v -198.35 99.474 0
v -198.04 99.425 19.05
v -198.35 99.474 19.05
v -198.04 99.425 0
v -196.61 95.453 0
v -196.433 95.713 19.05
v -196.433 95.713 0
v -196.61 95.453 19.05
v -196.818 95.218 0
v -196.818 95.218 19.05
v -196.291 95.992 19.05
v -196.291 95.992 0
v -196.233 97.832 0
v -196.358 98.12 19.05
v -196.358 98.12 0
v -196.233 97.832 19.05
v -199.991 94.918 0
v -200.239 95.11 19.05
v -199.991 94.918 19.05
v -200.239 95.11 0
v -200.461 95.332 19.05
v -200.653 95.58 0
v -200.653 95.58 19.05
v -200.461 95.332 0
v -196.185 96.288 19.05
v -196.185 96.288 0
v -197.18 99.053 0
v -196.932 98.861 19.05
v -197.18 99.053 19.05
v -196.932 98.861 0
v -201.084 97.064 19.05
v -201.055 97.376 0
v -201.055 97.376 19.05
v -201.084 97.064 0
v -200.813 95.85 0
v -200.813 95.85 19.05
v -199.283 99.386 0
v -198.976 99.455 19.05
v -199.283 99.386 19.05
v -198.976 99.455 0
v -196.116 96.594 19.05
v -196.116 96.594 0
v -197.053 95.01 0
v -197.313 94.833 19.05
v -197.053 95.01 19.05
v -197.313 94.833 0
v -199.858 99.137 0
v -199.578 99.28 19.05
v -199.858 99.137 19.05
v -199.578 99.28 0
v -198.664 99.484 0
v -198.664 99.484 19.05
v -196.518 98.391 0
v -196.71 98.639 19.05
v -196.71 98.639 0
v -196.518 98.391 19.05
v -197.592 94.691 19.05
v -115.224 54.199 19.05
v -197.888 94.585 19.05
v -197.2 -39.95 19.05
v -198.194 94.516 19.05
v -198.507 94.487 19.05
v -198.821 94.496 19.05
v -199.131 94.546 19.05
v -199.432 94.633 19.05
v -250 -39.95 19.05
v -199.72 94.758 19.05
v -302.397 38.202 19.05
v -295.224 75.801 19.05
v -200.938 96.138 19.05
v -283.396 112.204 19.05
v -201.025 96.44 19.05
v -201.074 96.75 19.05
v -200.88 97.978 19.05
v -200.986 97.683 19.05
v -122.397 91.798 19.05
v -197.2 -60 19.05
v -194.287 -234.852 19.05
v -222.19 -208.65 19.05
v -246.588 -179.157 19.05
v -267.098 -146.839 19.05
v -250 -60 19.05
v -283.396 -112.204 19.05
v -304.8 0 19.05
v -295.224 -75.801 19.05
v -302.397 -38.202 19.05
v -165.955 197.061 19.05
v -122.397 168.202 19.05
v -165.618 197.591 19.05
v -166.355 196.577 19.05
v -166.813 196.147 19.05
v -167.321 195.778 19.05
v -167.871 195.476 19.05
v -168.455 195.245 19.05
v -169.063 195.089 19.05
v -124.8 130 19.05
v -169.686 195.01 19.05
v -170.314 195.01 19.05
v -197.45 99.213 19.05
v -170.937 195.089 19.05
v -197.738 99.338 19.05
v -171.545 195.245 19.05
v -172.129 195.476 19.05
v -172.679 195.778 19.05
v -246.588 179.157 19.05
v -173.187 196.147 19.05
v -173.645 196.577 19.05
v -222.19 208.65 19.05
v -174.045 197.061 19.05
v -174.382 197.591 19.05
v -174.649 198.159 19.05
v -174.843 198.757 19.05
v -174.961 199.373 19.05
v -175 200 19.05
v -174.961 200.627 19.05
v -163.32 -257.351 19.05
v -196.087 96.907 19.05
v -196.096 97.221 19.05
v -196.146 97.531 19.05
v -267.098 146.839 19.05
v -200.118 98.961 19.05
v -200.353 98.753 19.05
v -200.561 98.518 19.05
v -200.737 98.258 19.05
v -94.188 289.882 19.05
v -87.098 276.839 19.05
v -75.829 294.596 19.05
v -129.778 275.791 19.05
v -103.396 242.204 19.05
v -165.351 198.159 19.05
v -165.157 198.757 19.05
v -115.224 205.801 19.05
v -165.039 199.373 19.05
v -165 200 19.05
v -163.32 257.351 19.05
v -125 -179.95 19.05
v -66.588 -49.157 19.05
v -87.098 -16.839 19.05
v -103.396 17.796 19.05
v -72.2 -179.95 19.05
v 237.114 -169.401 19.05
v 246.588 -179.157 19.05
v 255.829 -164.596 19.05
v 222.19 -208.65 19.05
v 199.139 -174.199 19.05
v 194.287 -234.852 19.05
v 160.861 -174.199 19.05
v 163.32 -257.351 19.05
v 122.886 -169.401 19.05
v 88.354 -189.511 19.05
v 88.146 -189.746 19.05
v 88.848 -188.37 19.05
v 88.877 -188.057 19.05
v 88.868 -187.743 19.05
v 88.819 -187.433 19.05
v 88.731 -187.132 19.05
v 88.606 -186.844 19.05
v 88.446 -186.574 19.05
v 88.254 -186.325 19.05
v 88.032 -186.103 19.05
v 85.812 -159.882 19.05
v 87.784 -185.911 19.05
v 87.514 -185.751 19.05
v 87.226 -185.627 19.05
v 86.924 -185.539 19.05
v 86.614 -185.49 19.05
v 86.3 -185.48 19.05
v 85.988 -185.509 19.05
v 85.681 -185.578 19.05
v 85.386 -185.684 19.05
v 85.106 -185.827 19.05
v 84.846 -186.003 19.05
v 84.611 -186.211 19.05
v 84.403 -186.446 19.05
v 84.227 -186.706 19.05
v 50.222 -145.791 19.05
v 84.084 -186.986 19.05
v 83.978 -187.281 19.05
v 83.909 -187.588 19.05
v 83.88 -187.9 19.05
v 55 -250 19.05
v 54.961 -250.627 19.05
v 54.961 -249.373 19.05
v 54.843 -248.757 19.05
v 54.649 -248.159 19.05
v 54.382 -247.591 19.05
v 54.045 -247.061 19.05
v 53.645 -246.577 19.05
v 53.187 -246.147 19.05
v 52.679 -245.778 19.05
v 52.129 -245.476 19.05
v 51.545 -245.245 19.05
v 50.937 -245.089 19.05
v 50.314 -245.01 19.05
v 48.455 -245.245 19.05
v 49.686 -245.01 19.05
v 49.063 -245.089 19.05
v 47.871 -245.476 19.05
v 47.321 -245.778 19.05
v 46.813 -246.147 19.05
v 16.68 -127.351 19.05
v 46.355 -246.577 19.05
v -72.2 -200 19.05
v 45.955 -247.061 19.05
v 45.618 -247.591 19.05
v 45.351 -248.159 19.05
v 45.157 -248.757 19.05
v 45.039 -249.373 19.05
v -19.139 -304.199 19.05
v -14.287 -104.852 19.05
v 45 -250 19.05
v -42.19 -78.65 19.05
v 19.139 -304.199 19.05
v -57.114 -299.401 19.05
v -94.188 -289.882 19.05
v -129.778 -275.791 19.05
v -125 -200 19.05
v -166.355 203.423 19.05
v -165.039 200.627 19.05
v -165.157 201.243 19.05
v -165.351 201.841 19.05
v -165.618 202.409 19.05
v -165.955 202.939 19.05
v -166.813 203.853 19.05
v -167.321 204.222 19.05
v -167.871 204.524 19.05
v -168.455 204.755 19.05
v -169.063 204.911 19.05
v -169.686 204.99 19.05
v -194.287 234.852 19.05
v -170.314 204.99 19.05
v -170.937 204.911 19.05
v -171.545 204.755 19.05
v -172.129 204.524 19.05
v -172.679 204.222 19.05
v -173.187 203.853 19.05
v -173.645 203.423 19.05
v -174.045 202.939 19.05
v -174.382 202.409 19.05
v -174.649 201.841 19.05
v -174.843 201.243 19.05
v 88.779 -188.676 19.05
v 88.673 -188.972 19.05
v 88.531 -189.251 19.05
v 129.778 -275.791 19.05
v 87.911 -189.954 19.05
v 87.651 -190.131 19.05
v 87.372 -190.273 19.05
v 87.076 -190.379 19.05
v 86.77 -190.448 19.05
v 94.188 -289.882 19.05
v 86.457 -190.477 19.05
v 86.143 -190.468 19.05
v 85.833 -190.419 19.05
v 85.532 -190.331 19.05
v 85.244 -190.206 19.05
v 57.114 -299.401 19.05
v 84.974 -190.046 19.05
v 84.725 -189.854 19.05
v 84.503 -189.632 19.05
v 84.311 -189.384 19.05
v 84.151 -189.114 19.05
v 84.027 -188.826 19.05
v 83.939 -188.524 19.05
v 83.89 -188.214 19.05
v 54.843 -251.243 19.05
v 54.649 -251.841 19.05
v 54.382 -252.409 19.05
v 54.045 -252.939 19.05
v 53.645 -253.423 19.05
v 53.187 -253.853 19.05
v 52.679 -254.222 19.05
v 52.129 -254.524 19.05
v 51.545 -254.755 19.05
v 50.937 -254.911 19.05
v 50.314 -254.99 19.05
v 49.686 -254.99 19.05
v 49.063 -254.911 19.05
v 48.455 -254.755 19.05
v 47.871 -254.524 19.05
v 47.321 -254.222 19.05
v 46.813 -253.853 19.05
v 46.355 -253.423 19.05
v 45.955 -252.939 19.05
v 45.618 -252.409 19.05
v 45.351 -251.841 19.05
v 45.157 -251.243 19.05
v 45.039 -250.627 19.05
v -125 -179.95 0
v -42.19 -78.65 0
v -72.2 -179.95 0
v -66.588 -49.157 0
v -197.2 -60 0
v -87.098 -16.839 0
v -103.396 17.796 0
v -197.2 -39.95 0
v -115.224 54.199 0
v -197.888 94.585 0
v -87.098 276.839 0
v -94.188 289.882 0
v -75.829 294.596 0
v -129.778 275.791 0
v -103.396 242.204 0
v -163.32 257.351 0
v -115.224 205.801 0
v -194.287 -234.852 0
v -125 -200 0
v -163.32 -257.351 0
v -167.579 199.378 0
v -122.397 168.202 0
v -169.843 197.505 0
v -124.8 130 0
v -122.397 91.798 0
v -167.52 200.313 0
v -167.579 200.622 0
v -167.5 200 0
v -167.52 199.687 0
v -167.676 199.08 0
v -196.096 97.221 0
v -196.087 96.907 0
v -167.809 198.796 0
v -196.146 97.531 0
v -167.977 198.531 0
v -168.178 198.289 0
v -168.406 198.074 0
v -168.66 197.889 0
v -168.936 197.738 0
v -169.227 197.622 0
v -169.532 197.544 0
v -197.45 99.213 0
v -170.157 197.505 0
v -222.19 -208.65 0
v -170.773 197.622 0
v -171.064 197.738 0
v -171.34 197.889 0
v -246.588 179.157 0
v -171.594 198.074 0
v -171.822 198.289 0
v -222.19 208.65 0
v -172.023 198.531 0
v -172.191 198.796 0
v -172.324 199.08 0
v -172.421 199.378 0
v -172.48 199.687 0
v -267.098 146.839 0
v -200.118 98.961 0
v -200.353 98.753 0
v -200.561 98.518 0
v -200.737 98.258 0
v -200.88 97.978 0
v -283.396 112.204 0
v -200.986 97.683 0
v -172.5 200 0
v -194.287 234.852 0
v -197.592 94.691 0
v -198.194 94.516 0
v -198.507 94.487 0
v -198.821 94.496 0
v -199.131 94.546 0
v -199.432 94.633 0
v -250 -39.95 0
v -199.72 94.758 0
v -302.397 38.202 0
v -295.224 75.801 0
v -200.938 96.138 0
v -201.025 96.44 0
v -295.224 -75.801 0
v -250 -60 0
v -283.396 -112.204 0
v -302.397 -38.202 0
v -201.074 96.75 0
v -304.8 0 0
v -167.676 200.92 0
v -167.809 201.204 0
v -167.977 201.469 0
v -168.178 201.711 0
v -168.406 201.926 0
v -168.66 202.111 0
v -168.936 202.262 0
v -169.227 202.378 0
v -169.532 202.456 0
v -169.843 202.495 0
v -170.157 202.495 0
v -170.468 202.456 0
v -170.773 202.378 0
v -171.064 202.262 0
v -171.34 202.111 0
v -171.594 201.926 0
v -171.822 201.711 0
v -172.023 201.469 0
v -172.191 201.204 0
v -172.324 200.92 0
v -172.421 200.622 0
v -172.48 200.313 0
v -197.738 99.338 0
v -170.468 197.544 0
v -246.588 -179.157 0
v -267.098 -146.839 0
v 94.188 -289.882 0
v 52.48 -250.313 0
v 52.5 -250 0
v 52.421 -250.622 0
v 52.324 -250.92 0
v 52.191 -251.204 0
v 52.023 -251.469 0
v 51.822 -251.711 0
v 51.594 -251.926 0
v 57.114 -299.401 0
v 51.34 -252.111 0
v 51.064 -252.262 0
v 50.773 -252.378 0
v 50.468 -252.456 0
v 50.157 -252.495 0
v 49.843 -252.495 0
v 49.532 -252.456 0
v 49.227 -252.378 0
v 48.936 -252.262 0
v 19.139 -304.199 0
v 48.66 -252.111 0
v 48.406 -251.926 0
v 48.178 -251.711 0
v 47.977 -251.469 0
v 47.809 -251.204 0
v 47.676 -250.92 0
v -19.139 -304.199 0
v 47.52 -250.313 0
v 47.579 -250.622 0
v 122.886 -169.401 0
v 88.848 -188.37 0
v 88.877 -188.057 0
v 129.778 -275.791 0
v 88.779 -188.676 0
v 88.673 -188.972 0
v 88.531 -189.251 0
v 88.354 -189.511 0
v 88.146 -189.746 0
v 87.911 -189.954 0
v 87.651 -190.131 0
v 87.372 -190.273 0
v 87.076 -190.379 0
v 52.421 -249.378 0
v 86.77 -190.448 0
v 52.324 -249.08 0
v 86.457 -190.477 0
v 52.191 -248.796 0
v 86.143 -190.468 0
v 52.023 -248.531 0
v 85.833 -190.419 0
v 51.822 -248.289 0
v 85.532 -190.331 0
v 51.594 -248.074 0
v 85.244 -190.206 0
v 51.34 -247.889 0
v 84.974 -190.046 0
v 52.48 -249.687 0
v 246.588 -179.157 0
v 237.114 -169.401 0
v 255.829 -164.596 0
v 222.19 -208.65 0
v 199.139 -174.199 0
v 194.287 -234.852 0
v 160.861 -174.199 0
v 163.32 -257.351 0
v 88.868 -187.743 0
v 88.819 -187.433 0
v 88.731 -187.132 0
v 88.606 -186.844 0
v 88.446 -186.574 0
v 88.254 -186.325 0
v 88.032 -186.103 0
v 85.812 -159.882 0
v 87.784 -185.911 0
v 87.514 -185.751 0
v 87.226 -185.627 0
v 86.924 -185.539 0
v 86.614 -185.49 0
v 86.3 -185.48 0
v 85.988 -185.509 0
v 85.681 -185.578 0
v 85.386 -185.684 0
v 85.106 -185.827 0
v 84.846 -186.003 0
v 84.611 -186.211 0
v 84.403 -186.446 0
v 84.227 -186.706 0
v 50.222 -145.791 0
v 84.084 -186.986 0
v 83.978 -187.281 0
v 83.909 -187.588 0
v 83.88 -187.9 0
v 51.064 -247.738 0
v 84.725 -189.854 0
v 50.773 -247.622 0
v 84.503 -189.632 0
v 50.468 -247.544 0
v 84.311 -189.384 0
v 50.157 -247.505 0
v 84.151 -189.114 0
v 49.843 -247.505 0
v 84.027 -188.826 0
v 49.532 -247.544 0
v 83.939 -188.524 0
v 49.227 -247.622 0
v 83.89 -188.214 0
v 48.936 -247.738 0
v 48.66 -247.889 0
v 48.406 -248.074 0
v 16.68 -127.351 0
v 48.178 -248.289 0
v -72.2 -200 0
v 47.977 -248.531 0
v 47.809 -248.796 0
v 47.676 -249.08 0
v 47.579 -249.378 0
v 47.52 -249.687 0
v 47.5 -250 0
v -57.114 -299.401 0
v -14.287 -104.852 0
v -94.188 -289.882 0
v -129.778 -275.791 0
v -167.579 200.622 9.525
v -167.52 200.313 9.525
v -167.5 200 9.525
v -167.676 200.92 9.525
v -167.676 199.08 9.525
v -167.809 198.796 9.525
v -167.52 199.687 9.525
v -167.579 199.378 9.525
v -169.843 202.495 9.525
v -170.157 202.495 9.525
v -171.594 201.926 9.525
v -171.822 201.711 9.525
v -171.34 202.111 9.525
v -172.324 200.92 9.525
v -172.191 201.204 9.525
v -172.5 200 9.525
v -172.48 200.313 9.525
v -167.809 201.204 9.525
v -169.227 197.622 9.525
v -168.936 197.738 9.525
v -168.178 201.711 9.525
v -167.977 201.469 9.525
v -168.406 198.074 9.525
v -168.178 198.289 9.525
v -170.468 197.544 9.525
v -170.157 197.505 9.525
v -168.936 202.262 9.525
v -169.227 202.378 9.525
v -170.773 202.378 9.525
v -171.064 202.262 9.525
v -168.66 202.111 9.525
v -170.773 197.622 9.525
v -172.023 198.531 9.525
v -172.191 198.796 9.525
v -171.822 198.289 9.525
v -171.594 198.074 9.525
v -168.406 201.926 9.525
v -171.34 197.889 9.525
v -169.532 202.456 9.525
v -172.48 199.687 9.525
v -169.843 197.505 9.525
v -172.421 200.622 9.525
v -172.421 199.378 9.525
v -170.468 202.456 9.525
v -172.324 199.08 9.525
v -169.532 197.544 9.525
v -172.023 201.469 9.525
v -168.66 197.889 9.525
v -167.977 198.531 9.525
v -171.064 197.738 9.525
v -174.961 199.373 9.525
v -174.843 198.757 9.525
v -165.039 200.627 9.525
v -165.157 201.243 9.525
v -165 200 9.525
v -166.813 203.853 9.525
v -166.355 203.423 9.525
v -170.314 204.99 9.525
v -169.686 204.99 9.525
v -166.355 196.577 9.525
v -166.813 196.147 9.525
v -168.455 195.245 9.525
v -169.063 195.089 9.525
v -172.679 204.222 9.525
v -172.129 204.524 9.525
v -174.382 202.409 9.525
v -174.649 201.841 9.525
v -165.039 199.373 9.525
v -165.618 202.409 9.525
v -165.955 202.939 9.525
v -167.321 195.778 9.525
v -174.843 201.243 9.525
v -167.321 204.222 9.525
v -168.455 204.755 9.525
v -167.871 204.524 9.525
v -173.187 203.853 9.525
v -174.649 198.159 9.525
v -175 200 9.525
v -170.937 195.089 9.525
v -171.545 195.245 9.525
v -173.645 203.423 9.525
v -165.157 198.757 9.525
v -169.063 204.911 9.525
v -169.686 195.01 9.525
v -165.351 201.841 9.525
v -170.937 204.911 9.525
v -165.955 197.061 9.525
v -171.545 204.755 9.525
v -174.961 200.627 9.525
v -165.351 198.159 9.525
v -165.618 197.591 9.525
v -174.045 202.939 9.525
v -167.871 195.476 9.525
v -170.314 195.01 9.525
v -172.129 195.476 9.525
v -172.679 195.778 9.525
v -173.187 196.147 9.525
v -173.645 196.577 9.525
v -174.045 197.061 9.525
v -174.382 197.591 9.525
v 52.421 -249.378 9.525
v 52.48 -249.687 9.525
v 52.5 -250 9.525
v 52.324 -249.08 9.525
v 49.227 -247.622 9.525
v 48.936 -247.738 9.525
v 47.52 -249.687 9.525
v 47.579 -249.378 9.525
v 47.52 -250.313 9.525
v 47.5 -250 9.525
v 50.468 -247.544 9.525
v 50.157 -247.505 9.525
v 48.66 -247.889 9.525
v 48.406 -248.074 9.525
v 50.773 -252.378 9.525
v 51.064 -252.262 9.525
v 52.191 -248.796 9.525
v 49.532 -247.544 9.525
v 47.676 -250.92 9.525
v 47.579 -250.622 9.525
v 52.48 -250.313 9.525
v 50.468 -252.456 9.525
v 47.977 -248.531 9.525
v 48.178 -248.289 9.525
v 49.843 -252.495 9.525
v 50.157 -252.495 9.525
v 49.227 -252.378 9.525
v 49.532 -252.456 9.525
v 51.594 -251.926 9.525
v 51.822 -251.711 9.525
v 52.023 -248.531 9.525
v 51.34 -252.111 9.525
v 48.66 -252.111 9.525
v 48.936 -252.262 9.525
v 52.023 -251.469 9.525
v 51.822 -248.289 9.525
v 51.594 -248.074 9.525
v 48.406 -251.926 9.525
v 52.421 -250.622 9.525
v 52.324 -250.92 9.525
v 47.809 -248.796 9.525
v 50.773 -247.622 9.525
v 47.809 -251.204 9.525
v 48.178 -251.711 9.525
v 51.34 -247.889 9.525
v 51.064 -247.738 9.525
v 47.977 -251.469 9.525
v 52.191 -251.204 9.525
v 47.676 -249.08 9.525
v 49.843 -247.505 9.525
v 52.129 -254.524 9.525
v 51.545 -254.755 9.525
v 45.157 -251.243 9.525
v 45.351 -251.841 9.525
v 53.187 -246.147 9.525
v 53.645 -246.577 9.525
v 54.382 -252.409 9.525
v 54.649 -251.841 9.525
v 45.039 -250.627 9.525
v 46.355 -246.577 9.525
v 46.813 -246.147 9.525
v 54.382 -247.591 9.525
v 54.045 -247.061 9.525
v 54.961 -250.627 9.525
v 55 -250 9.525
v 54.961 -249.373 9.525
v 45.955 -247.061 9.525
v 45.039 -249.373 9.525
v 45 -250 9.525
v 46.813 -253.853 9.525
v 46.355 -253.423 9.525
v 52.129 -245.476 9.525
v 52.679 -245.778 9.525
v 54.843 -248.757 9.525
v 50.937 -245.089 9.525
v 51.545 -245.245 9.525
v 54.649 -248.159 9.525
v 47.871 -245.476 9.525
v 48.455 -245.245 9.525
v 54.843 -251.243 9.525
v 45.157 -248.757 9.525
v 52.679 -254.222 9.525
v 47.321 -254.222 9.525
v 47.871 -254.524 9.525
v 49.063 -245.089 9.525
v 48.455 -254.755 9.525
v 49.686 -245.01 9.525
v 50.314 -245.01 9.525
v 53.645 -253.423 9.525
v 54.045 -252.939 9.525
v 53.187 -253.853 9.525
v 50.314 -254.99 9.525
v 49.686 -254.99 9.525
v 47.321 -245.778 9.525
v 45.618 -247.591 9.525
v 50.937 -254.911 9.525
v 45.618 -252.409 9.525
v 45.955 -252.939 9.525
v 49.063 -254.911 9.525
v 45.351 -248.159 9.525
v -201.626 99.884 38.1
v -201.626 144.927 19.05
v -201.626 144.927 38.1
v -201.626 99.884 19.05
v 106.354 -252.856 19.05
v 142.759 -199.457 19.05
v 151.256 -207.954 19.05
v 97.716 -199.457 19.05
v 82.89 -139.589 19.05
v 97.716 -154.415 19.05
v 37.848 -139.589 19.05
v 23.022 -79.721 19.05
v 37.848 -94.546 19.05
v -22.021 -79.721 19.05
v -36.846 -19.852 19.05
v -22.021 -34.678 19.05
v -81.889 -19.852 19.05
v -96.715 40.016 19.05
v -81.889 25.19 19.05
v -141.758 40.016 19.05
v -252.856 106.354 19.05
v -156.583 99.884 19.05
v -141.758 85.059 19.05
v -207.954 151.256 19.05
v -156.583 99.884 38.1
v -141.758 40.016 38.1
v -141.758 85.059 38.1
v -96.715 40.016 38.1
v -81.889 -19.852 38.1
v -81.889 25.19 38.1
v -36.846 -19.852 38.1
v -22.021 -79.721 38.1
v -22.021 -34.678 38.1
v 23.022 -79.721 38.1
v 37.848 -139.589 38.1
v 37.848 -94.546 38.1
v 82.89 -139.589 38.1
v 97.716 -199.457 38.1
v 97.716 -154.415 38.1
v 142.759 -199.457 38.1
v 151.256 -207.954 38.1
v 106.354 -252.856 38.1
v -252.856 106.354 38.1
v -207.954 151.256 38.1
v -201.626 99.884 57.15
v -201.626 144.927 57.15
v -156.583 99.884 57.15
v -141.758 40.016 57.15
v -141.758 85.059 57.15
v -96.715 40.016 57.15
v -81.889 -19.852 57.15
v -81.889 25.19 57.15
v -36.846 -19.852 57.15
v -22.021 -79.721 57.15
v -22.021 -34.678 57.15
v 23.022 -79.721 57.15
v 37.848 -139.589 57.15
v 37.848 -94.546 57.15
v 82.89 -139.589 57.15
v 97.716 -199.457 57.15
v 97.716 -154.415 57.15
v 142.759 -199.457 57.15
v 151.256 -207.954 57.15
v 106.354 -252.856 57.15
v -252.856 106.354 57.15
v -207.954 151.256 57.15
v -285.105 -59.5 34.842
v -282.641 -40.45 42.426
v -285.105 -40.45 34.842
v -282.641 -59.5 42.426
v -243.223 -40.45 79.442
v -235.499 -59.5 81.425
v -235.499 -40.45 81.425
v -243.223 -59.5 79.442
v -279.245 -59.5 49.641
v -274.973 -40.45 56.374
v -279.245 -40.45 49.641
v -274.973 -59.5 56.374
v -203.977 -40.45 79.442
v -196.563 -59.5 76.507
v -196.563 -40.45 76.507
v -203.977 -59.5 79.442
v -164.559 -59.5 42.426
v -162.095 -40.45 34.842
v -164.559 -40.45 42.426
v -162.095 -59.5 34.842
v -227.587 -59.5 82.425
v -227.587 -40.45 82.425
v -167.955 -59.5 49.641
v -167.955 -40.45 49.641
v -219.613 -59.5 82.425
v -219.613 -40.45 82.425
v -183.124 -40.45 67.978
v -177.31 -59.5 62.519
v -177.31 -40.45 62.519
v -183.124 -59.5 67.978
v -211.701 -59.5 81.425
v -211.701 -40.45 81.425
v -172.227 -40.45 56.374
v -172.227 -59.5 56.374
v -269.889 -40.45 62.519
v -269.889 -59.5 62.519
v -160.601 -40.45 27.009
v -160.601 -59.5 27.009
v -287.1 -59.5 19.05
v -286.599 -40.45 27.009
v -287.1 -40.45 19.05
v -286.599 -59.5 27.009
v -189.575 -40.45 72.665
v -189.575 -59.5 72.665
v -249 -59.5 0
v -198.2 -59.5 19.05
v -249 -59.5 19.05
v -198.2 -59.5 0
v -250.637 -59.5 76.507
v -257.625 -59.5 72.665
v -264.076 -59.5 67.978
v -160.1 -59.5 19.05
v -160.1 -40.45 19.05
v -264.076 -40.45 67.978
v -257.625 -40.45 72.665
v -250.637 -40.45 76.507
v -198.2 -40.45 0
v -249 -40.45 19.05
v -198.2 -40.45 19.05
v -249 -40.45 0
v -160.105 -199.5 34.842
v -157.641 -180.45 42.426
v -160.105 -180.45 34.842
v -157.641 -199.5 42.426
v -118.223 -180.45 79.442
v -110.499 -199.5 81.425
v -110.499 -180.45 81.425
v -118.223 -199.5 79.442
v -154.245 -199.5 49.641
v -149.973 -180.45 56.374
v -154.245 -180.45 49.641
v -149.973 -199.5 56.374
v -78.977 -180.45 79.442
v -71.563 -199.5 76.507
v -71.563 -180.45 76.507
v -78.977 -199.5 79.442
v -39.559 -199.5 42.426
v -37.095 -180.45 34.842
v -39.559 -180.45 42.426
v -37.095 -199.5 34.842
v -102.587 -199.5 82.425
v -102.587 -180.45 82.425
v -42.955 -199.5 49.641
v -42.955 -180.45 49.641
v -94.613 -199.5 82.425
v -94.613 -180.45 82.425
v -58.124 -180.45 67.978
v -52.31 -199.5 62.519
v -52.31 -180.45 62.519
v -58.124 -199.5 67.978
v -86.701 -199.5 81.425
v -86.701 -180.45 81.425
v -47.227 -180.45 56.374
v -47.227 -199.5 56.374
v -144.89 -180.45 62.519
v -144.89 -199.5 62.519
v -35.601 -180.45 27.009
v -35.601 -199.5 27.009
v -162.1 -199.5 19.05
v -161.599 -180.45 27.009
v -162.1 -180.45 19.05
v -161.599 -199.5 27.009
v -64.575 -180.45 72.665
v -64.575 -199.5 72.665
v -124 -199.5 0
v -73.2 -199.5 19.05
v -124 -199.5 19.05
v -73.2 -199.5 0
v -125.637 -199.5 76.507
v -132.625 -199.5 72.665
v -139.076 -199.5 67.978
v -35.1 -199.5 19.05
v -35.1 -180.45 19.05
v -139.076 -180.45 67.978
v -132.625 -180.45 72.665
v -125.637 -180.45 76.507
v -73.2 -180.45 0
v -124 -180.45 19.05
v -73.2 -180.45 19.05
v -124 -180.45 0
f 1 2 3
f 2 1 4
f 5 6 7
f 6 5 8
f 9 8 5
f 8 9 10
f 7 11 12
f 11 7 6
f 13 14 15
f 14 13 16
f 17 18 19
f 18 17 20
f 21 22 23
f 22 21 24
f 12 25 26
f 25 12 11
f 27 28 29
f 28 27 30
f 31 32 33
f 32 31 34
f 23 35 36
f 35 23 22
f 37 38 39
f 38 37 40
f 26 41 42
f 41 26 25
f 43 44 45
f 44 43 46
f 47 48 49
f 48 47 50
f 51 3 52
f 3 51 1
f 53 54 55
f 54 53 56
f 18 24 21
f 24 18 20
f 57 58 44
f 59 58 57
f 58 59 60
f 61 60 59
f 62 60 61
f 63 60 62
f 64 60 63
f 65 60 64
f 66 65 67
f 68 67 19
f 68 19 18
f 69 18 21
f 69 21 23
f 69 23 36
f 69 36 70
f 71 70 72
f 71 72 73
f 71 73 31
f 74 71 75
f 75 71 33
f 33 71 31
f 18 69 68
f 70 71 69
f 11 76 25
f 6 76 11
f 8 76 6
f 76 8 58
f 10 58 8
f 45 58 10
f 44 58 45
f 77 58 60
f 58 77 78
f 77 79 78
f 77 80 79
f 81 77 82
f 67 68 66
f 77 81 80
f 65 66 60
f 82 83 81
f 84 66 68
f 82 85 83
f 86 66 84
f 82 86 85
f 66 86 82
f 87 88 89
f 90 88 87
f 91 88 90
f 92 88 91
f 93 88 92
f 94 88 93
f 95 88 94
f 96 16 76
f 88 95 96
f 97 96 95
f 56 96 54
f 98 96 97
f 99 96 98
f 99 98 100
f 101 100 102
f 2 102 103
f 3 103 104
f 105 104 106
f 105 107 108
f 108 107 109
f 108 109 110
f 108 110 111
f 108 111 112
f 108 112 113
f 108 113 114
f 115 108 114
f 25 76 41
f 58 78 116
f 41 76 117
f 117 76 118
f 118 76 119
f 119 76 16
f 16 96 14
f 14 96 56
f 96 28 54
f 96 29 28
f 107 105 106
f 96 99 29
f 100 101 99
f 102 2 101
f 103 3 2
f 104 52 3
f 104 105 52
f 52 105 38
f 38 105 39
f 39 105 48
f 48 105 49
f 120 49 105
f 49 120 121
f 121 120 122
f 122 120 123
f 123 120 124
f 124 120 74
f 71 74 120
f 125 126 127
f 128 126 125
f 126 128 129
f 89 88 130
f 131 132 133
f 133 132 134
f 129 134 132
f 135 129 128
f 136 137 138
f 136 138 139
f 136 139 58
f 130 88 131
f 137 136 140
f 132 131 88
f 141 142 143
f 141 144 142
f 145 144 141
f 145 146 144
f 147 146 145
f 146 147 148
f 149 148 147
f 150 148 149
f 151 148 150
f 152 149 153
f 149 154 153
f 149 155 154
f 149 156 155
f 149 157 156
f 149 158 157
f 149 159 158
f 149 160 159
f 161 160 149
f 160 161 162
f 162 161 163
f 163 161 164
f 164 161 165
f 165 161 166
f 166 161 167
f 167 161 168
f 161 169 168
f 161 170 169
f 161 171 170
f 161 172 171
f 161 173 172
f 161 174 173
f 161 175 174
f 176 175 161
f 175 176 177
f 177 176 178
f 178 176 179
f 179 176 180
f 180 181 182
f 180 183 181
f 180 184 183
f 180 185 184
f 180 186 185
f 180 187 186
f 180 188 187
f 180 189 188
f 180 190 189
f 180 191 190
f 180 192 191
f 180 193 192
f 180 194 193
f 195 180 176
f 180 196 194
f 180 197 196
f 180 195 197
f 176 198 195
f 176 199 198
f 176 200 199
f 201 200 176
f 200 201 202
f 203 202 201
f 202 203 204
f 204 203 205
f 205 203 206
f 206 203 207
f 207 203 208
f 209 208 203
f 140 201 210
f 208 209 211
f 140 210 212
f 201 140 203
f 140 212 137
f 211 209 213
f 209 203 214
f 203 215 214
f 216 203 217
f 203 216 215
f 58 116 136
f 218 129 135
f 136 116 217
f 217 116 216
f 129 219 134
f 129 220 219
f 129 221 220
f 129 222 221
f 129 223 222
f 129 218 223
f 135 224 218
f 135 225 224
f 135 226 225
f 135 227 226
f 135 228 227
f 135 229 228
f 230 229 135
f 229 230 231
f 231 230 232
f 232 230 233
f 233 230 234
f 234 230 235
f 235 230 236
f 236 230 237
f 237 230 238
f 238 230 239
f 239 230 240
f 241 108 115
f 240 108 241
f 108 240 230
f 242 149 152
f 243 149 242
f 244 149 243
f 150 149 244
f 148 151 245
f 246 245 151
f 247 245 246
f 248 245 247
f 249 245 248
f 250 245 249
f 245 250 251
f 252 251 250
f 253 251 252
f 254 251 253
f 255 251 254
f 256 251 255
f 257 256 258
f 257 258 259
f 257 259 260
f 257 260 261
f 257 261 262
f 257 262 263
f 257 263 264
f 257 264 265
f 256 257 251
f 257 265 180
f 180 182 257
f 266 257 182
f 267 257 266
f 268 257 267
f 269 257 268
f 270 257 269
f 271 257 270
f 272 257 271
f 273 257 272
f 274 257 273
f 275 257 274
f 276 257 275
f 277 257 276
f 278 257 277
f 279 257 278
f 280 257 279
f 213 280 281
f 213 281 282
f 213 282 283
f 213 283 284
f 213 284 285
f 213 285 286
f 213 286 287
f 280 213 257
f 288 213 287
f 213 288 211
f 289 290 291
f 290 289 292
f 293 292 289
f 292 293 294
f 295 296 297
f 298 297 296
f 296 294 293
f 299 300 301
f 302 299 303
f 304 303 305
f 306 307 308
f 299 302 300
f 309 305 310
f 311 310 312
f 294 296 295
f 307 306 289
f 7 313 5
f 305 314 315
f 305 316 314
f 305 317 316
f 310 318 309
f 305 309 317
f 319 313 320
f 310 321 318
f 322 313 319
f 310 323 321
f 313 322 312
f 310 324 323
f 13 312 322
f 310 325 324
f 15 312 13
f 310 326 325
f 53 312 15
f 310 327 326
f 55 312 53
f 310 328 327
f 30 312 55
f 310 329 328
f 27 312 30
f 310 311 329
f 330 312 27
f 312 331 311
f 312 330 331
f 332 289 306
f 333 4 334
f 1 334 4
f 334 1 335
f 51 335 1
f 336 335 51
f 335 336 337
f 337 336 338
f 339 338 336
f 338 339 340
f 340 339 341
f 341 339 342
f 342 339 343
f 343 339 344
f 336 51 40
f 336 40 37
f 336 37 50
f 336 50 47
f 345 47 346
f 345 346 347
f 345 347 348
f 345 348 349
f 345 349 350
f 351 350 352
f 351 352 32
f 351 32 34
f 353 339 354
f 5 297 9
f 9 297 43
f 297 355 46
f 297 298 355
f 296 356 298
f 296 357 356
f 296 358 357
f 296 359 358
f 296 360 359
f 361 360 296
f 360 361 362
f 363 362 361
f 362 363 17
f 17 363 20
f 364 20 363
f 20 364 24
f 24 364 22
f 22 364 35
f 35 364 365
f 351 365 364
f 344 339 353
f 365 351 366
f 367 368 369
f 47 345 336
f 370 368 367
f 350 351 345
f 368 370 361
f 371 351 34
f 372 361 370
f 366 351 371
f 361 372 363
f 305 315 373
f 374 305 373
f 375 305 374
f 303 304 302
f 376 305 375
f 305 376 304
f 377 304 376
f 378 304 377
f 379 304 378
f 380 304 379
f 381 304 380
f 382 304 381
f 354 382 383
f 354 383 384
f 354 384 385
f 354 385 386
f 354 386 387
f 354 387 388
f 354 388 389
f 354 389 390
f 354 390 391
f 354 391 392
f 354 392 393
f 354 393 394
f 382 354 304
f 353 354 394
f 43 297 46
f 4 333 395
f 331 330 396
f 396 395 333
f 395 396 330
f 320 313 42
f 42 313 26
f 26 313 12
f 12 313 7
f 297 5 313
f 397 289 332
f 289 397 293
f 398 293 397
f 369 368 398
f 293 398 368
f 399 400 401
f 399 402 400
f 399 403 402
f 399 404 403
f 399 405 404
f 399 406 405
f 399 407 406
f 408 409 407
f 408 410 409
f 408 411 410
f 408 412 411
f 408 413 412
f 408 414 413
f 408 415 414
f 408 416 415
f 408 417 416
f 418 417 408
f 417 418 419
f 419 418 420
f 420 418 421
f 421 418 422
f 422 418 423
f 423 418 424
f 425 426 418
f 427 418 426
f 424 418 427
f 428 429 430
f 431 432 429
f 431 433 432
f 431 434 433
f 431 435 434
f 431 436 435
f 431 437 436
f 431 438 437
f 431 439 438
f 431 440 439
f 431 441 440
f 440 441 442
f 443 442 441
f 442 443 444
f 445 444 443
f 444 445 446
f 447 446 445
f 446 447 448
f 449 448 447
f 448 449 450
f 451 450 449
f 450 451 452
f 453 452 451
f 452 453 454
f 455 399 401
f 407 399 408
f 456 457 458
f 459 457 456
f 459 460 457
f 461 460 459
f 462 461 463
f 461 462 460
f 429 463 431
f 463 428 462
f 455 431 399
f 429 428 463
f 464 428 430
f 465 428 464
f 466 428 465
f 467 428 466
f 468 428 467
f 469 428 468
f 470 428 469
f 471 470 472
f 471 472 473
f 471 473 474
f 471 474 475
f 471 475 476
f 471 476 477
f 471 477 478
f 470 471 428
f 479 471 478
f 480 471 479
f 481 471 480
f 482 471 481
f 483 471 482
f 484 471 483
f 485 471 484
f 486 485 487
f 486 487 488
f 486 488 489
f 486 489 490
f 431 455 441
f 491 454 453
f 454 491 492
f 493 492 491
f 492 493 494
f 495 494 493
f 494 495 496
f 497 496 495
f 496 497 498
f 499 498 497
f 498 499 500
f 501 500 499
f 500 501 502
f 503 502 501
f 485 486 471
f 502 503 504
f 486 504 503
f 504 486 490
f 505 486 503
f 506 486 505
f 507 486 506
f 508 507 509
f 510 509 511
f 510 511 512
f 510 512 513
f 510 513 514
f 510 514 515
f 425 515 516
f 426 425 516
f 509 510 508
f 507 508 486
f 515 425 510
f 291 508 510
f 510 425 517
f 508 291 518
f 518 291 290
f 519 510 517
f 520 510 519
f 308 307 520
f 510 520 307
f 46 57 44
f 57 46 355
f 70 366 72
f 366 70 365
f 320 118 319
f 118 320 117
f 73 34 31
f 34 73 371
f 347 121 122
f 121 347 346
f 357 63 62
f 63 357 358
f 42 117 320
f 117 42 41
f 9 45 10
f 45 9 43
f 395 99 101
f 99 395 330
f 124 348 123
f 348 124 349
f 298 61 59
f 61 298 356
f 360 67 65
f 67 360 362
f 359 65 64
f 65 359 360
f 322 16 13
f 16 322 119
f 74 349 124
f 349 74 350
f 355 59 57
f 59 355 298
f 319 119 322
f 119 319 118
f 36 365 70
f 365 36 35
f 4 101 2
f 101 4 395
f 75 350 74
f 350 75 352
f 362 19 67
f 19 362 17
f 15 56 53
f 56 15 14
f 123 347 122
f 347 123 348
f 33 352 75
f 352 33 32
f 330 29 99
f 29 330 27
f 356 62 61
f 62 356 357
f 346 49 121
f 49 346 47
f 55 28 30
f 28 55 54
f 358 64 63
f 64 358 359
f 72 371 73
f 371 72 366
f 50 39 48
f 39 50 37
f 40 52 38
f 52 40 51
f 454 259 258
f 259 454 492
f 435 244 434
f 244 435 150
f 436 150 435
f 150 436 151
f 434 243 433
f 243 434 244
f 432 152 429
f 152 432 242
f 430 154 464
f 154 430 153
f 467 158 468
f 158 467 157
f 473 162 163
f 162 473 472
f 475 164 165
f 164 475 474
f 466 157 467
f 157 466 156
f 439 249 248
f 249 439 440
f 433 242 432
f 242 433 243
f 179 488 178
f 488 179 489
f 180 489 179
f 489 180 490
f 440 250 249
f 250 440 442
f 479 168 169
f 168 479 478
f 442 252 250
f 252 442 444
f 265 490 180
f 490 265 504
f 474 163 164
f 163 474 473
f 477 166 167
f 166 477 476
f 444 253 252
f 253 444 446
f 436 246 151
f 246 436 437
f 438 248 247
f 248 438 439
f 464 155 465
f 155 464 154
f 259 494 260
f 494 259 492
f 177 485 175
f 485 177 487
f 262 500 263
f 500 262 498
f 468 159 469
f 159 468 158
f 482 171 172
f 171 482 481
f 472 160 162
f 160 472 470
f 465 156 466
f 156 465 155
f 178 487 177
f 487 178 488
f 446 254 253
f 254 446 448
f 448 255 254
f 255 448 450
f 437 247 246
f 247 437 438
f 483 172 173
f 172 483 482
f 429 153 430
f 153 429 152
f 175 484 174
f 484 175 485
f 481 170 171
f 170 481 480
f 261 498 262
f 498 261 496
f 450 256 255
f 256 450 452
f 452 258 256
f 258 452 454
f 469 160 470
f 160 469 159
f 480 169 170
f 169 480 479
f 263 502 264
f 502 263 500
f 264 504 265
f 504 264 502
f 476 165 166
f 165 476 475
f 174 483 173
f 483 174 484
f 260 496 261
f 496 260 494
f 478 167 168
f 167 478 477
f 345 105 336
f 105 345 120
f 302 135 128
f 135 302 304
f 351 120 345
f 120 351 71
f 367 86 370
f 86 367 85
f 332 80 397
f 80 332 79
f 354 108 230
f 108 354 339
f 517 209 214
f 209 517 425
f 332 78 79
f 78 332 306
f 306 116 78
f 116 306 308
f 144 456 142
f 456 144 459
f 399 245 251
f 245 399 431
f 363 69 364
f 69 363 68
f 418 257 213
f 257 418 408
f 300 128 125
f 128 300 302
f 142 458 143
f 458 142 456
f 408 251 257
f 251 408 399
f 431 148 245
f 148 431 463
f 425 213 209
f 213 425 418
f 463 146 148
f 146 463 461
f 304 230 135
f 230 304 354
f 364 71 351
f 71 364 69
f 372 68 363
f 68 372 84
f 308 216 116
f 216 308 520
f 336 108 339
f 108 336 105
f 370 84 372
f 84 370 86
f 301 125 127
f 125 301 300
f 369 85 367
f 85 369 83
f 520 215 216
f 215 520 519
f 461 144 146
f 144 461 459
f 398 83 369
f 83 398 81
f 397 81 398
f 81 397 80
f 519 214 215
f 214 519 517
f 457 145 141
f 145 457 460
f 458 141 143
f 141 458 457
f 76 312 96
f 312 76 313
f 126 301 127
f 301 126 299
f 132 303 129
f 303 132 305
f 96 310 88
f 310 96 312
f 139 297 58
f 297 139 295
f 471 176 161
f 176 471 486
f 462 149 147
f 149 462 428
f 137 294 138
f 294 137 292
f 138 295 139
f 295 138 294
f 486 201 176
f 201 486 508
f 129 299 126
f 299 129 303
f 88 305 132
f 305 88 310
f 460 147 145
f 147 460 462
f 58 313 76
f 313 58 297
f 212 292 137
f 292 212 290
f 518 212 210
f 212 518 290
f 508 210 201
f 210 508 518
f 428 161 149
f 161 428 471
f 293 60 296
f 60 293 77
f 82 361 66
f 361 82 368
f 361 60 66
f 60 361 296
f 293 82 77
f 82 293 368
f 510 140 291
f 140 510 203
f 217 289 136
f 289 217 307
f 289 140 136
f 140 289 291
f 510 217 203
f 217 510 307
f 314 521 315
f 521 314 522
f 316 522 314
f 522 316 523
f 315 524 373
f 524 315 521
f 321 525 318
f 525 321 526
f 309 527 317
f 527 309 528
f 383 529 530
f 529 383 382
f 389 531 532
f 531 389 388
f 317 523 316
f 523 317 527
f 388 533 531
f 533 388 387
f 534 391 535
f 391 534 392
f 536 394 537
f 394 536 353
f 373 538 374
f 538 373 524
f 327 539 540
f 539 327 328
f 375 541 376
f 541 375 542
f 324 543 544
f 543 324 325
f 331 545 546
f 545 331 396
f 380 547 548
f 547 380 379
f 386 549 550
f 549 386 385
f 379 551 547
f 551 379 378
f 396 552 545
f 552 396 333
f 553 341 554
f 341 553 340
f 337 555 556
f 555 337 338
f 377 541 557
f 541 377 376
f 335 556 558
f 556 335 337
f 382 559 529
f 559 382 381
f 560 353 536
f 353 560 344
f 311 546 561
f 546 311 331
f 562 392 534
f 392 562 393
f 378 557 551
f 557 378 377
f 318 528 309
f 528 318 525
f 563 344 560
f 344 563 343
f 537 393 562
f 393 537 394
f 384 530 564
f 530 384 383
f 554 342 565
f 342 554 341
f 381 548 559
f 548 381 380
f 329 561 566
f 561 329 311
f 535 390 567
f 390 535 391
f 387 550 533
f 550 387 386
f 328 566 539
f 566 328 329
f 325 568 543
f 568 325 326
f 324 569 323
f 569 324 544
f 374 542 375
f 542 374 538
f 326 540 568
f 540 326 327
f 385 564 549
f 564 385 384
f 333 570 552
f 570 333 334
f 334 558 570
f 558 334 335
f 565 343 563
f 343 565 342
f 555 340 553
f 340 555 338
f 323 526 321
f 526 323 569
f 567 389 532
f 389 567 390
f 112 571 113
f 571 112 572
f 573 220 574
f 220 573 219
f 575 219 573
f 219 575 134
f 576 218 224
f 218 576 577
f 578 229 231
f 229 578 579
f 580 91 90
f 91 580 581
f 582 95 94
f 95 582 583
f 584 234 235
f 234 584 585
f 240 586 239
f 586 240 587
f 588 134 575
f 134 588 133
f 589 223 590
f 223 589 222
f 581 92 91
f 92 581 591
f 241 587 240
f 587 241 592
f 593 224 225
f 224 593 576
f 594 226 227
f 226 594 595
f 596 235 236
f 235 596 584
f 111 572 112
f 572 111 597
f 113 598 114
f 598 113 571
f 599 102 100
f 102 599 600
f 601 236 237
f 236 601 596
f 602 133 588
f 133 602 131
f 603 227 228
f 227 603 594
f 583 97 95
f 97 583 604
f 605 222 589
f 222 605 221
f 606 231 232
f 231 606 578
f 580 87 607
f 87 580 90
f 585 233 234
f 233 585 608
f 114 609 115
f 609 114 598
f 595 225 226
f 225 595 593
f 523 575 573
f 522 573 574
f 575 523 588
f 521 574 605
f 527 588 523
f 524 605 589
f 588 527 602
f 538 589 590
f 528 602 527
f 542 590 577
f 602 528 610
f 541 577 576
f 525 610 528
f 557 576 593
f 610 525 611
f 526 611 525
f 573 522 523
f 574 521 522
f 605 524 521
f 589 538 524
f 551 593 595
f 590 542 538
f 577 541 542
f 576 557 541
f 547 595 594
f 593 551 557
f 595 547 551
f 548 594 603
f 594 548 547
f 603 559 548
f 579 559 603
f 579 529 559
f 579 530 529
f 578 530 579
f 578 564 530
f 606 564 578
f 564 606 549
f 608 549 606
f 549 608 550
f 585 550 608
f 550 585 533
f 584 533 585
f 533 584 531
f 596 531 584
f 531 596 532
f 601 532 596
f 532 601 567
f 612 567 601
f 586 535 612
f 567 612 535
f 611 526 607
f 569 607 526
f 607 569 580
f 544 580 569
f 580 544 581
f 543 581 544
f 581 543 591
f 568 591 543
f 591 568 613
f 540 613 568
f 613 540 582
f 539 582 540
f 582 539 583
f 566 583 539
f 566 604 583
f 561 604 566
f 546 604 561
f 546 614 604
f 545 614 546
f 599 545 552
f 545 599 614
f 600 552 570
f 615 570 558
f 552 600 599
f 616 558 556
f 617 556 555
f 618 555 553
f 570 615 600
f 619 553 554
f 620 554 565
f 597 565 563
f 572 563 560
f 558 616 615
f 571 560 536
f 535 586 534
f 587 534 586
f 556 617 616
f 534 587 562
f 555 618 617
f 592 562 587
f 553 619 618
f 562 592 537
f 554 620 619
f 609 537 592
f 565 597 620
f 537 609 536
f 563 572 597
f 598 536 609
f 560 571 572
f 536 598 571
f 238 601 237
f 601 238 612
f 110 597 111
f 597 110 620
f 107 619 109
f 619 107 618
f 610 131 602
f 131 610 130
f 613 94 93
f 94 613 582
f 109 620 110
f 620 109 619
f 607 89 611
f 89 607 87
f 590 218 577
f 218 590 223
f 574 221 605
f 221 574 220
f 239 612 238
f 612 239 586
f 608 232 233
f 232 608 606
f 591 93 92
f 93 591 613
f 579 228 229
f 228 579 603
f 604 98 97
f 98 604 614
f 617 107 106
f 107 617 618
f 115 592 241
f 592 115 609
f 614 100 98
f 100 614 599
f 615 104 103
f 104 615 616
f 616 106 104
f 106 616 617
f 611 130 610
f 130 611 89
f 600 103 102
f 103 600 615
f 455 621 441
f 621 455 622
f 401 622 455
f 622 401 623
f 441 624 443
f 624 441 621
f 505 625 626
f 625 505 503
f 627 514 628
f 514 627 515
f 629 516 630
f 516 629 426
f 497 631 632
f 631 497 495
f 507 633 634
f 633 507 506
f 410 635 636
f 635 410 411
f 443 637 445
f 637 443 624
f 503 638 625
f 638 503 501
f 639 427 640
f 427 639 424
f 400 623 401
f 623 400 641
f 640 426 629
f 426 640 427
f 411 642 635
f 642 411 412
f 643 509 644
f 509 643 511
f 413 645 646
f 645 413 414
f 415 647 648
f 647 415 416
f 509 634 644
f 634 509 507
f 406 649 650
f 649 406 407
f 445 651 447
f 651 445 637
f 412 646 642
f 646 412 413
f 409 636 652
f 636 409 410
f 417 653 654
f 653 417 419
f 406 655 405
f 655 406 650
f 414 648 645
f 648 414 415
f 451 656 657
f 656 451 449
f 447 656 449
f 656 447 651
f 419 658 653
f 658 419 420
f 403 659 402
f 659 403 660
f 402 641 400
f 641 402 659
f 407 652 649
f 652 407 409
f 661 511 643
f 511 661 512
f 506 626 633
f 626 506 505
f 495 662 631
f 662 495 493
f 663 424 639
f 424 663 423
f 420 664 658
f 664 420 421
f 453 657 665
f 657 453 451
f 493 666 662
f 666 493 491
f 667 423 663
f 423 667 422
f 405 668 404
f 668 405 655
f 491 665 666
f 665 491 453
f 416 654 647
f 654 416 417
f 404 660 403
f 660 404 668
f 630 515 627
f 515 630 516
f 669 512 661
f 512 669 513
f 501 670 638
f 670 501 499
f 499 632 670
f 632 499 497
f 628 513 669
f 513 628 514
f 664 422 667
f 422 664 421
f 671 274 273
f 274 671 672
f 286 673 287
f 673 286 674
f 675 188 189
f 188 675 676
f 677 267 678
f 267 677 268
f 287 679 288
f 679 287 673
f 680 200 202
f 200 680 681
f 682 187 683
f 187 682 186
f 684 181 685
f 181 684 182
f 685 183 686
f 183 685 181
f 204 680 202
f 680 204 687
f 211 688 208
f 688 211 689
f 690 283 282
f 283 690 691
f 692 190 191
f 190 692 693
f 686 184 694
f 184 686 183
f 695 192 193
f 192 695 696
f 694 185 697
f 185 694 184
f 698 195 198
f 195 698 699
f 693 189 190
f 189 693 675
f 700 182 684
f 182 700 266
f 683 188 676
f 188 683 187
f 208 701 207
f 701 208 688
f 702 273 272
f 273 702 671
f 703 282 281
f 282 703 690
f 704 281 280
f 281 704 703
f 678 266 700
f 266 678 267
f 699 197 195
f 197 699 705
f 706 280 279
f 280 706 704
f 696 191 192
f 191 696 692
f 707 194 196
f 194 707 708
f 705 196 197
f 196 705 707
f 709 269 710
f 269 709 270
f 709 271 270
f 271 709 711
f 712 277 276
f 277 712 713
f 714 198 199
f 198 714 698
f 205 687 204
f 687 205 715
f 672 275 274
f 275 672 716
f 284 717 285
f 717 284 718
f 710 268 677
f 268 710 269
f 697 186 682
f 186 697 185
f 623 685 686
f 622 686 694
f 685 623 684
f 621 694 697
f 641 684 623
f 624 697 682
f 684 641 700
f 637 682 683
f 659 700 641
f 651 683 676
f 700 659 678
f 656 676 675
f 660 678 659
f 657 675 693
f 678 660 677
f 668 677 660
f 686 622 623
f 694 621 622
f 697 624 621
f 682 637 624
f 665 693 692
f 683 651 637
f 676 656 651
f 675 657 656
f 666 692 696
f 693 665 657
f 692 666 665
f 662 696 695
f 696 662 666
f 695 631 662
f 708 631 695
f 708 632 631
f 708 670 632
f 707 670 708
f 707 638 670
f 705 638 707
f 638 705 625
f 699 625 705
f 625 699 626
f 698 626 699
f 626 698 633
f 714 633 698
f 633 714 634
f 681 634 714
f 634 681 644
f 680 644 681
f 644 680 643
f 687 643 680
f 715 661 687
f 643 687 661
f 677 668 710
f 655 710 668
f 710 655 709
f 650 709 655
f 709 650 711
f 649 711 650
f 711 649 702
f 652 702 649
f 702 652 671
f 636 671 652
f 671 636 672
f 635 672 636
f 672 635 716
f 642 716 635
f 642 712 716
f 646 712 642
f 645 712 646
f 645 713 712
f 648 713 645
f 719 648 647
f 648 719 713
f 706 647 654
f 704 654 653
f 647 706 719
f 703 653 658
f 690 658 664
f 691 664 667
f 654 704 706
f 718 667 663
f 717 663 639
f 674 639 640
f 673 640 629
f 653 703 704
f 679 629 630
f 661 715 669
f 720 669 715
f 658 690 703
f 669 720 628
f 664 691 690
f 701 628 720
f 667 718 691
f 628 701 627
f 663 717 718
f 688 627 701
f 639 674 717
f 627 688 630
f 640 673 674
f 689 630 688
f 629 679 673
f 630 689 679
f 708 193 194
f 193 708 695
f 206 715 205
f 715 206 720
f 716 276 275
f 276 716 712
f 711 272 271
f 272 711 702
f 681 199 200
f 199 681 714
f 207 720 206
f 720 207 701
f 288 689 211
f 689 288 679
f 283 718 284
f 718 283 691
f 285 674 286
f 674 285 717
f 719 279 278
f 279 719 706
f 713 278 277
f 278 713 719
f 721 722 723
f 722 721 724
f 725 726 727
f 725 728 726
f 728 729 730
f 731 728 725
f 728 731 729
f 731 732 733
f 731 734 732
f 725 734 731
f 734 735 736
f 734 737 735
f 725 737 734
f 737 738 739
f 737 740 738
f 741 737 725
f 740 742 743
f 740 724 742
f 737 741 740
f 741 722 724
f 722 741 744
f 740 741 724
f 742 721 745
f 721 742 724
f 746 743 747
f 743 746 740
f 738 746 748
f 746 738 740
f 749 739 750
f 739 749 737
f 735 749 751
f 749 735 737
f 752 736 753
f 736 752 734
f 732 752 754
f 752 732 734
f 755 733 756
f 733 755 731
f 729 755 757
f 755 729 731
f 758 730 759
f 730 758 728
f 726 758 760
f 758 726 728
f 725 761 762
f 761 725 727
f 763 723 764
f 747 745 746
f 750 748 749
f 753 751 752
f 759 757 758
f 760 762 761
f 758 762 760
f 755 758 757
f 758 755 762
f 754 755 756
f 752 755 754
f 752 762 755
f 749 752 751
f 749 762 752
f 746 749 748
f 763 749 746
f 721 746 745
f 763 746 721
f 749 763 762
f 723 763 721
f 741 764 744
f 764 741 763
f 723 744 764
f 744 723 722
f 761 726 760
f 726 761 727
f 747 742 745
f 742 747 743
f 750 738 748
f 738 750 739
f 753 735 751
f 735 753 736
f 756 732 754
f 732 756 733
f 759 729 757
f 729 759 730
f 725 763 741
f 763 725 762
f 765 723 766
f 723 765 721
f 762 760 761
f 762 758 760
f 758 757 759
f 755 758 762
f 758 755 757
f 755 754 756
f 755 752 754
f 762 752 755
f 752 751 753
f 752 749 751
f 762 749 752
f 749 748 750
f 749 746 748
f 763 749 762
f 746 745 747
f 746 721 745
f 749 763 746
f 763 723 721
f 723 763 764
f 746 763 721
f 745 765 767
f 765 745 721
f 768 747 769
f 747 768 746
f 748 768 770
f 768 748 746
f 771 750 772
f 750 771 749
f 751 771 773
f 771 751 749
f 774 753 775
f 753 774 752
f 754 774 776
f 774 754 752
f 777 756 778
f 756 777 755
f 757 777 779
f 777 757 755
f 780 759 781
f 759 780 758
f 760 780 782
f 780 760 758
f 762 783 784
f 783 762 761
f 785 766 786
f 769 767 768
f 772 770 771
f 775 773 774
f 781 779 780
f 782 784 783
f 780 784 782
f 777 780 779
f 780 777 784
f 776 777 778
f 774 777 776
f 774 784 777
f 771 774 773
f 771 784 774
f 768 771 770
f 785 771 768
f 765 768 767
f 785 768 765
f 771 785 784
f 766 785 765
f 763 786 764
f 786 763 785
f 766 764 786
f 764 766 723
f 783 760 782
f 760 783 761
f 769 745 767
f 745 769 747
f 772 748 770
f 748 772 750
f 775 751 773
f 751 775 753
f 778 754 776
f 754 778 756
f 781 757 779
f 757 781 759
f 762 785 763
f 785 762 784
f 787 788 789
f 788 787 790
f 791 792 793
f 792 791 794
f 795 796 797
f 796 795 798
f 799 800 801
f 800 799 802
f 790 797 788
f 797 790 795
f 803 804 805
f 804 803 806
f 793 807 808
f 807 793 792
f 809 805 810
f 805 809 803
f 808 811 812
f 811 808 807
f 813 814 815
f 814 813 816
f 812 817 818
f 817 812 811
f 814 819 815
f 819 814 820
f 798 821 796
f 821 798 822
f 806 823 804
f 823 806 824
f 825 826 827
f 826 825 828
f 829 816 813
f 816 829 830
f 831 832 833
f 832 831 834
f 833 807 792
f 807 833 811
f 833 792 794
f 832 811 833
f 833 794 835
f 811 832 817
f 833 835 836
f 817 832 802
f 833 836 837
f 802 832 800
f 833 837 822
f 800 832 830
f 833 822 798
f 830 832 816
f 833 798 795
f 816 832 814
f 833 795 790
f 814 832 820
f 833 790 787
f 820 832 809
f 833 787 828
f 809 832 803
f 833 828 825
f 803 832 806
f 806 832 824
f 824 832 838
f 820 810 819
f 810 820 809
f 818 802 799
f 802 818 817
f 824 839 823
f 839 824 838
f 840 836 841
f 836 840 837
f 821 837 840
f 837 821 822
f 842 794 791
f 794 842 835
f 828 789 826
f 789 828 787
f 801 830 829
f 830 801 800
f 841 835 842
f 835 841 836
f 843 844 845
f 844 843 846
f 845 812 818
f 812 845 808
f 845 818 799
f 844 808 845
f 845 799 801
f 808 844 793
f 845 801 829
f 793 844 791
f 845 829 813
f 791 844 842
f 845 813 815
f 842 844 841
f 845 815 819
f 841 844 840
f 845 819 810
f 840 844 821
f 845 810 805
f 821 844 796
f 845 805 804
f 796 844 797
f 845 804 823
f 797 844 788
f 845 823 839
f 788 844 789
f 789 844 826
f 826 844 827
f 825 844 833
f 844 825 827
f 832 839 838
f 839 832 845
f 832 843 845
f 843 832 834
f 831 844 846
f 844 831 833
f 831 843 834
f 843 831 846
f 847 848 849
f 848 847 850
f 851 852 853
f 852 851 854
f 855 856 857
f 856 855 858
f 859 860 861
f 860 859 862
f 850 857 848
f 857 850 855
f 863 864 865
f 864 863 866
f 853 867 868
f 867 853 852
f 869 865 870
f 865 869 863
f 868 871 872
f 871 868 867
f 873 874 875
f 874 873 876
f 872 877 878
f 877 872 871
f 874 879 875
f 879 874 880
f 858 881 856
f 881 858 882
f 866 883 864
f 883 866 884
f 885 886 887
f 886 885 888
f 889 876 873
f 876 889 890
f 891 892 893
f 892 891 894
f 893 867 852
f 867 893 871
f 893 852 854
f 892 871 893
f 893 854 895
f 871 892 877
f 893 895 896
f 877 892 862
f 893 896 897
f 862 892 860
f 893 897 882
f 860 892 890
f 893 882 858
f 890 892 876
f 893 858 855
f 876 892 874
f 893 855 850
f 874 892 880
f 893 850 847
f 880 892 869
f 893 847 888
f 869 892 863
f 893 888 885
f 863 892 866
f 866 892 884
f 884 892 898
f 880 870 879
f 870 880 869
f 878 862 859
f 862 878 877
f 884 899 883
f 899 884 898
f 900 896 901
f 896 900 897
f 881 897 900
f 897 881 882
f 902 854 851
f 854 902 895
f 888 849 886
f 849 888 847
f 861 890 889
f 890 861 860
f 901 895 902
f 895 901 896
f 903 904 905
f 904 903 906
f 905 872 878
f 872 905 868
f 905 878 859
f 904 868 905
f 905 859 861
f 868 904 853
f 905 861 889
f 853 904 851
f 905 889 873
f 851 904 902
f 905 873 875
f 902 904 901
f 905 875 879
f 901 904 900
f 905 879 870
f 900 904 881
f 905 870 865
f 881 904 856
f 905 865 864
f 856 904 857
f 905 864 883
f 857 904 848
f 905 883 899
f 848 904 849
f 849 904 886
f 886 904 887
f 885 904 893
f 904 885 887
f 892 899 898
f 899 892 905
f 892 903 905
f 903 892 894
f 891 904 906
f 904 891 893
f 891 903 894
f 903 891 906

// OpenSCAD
moon_3d=true; //if true, 3d, else 2d
moon_diameter=24*25.4;
moon_offset_x=180; //offset for piece not full
moon_offset_y=130;
split_moon_in_half=true; //if needed to fit in your work area
shelf_length=20*25.4;
shelf_width=2.5*25.4;
shelf_rotate=-45;
shelf_offset_x=-2*25.4;
shelf_offset_y=-2*25.4;
shelf_subdivision=2*25.4; //width of each one
shelf_subdivision_offset=-10;//offset the beginning of the smaller sections of the shelf
shelf_subdivision_count=6;//number of subdivisions
shelf_securement_holes_diameter=4;
shelf_securement_holes_position_left=45;//distance from each end - 2 screws
shelf_securement_holes_position_right=60;//distance from each end - 2 screws
double_shelf=true; //if true, will double the thickness of the smaller shelves
wall_securement_holes_diameter=5;
wall_securement_holes_countersink_diameter=10;
wall_securement_holes_countersink_depth=0.75*25.4*0.5;
wall_securement_holes_position=15;
wall_securement_holes_position_x_1=-170;
wall_securement_holes_position_y_1=200;
wall_securement_holes_position_x_2=50;
wall_securement_holes_position_y_2=-250;
circle_shelf_diameter=5*25.4;
circle_shelf_depth_offset=0;//increase or decrease the depth of the circle shelf - will change diameter somewhat too
circle_shelf_tab_width=2*25.4;
circle_shelf_tab_tolerance=2; //increase hole for tab by this amount
circle_shelf_position_x_1=-250;
circle_shelf_position_y_1=-60;
circle_shelf_position_x_2=-125;
circle_shelf_position_y_2=-200;
circle_shelf_z_offset=0.75*25.4;
material_thickness=0.75*25.4;
material_thickness_tolerance=1;
//include <../Joints/bulb_joint.scad>; //only used if moon is split in half
//circle_diameter and number and width are for the bulb joint if used
circle_diameter=20;
circle_number=10; //number per side 200
width=circle_diameter*circle_number;
joint_offset=15;

$fn=50;

module moon_whole(){
difference(){
circle(d=moon_diameter);
translate([moon_offset_x,moon_offset_y])
circle(d=moon_diameter);
translate([shelf_offset_x,shelf_offset_y]){
rotate([0,0,shelf_rotate]){
translate([-shelf_length/2+shelf_securement_holes_position_left,0]){
circle(d=wall_securement_holes_diameter);
}
translate([shelf_length/2-shelf_securement_holes_position_right,0]){
circle(d=wall_securement_holes_diameter);
}
}
}
translate([circle_shelf_position_x_1,circle_shelf_position_y_1])
square([circle_shelf_tab_width+circle_shelf_tab_tolerance,material_thickness+material_thickness_tolerance]);
translate([circle_shelf_position_x_2,circle_shelf_position_y_2])
square([circle_shelf_tab_width+circle_shelf_tab_tolerance,material_thickness+material_thickness_tolerance]);

translate([shelf_length/2-shelf_securement_holes_position_right,0,0]){
circle(d=wall_securement_holes_diameter);
}

translate([wall_securement_holes_position_x_1,wall_securement_holes_position_y_1])
circle(d=wall_securement_holes_diameter);

translate([wall_securement_holes_position_x_2,wall_securement_holes_position_y_2])
circle(d=wall_securement_holes_diameter);
}}


module moon_top(){
difference(){
moon_whole();
rotate([0,0,-135])
translate([-moon_diameter/2,0])
square([moon_diameter,moon_diameter*2]);
}

rotate([0,0,-135])
translate([moon_diameter/2-sqrt(moon_offset_x*moon_offset_x+moon_offset_y*moon_offset_y)+joint_offset,10])
bulb_joint();
}

module moon_bottom(){
difference(){
moon_whole();
rotate([0,0,135])
translate([0,-moon_diameter/2])
square([moon_diameter,moon_diameter]);

rotate([0,0,-135])
translate([moon_diameter/2-sqrt(moon_offset_x*moon_offset_x+moon_offset_y*moon_offset_y)+joint_offset,10])
bulb_joint();
}}

if (moon_3d==false){
if (split_moon_in_half==false){
moon_whole();}
else if (split_moon_in_half==true){
translate([-5,5])
moon_top();
translate([25,-30])
moon_bottom();
}
translate([200+shelf_offset_x,50+shelf_offset_y,0]){
rotate([0,0,shelf_rotate]){
difference(){
square([shelf_length,shelf_width],center=true);
for (a=[-shelf_subdivision/2:shelf_subdivision_count/2]){
translate([shelf_length/shelf_subdivision_count*a+shelf_subdivision_offset,0])
rotate([0,0,45])
square([shelf_subdivision,shelf_length/shelf_subdivision_count]);
}
}
}
}
if (double_shelf==true){
translate([250+shelf_offset_x,100+shelf_offset_y,0]){
rotate([0,0,shelf_rotate]){
difference(){
square([shelf_length,shelf_width],center=true);
for (a=[-shelf_subdivision/2:shelf_subdivision_count/2]){
translate([shelf_length/shelf_subdivision_count*a+shelf_subdivision_offset,0])
rotate([0,0,45])
square([shelf_subdivision,shelf_length/shelf_subdivision_count]);
}
}
}
}
}

translate([-10,30]){
difference(){
circle(d=circle_shelf_diameter);
translate([-circle_shelf_diameter/2,circle_shelf_depth_offset])
square([circle_shelf_diameter,circle_shelf_diameter]);
}
translate([-circle_shelf_tab_width/2,circle_shelf_depth_offset])
square([circle_shelf_tab_width,material_thickness]);
}
translate([80,-50]){
difference(){
circle(d=circle_shelf_diameter);
translate([-circle_shelf_diameter/2,circle_shelf_depth_offset])
square([circle_shelf_diameter,circle_shelf_diameter]);
}
translate([-circle_shelf_tab_width/2,circle_shelf_depth_offset])
square([circle_shelf_tab_width,material_thickness]);
}
}

else if (moon_3d==true){
difference(){
cylinder(d=moon_diameter,h=material_thickness);
translate([moon_offset_x,moon_offset_y,-0.1])
cylinder(d=moon_diameter,h=material_thickness+0.2);
translate([shelf_offset_x,shelf_offset_y,0]){
rotate([0,0,shelf_rotate]){
translate([-shelf_length/2+shelf_securement_holes_position_left,0,0]){
cylinder(d=wall_securement_holes_diameter,h=material_thickness);
}
translate([shelf_length/2-shelf_securement_holes_position_right,0,0]){
cylinder(d=wall_securement_holes_diameter,h=material_thickness);
}
}
}
translate([circle_shelf_position_x_1,circle_shelf_position_y_1,-0.1])
cube([circle_shelf_tab_width+circle_shelf_tab_tolerance,material_thickness+material_thickness_tolerance,material_thickness+0.2]);
translate([circle_shelf_position_x_2,circle_shelf_position_y_2,-0.1])
cube([circle_shelf_tab_width+circle_shelf_tab_tolerance,material_thickness+material_thickness_tolerance,material_thickness+0.2]);

translate([wall_securement_holes_position_x_1,wall_securement_holes_position_y_1,-0.1])
cylinder(d=wall_securement_holes_diameter,h=material_thickness+0.2);

translate([wall_securement_holes_position_x_1,wall_securement_holes_position_y_1,material_thickness-wall_securement_holes_countersink_depth])
cylinder(d=wall_securement_holes_countersink_diameter,h=material_thickness);

translate([wall_securement_holes_position_x_2,wall_securement_holes_position_y_2,-0.1])
cylinder(d=wall_securement_holes_diameter,h=material_thickness+0.2);

translate([wall_securement_holes_position_x_2,wall_securement_holes_position_y_2,material_thickness-wall_securement_holes_countersink_depth])
cylinder(d=wall_securement_holes_countersink_diameter,h=material_thickness);
}

translate([shelf_offset_x,shelf_offset_y,material_thickness]){
rotate([0,0,shelf_rotate]){
difference(){
translate([0,0,material_thickness/2])
cube([shelf_length,shelf_width,material_thickness],center=true);
for (a=[-shelf_subdivision/2:shelf_subdivision_count/2]){
translate([shelf_length/shelf_subdivision_count*a+shelf_subdivision_offset,-0.1])
rotate([0,0,45])
cube([shelf_subdivision,shelf_length/shelf_subdivision_count,material_thickness+0.2]);
}
}
}
}
if (double_shelf==true){
translate([shelf_offset_x,shelf_offset_y,material_thickness*2]){
rotate([0,0,shelf_rotate]){
difference(){
translate([0,0,material_thickness/2])
cube([shelf_length,shelf_width,material_thickness],center=true);
for (a=[-shelf_subdivision/2:shelf_subdivision_count/2]){
translate([shelf_length/shelf_subdivision_count*a+shelf_subdivision_offset,-0.1])
rotate([0,0,45])
cube([shelf_subdivision,shelf_length/shelf_subdivision_count,material_thickness+0.2]);
}
}
}
}
}

translate([circle_shelf_position_x_1+circle_shelf_tab_width/2+circle_shelf_tab_tolerance/2,circle_shelf_position_y_1+material_thickness_tolerance/2,circle_shelf_z_offset]){
rotate([-90,0,0]){
difference(){
cylinder(d=circle_shelf_diameter,h=material_thickness);
translate([-circle_shelf_diameter/2,circle_shelf_depth_offset,-0.1])
cube([circle_shelf_diameter,circle_shelf_diameter,material_thickness+0.2]);
}
translate([-circle_shelf_tab_width/2,circle_shelf_depth_offset,0])
cube([circle_shelf_tab_width,material_thickness,material_thickness]);
}
}

translate([circle_shelf_position_x_2+circle_shelf_tab_width/2+circle_shelf_tab_tolerance/2,circle_shelf_position_y_2+material_thickness_tolerance/2,circle_shelf_z_offset]){
rotate([-90,0,0]){
difference(){
cylinder(d=circle_shelf_diameter,h=material_thickness);
translate([-circle_shelf_diameter/2,circle_shelf_depth_offset,-0.1])
cube([circle_shelf_diameter,circle_shelf_diameter,material_thickness+0.2]);
}
translate([-circle_shelf_tab_width/2,circle_shelf_depth_offset,0])
cube([circle_shelf_tab_width,material_thickness,material_thickness]);
}
}
}

//bulb joint modules follow
module bulb_joint_mirror(){
mirror([0,1])
bulb_joint();
}

module bulb_joint(){
difference(){
translate([0,-circle_diameter])
square([width,circle_diameter*1.5]);
top_half();
translate([0,sin(45)*circle_diameter/2])
square([width,circle_diameter*1.5]);
}
bottom_half();
}

module top_half(){
difference(){
for (a=[0:(circle_number-1)]){
translate([2*sin(45)*a*circle_diameter,0])
circle(d=circle_diameter);
}

translate([-circle_diameter/2,-circle_diameter/2])
square([circle_diameter/2,circle_diameter]);

translate([width,-circle_diameter/2])
square([100,circle_diameter*2]);
}

}

module bottom_half(){
difference(){
for (a=[0:(circle_number-1)]){
translate([circle_diameter*sin(45)+2*sin(45)*a*circle_diameter,circle_diameter*sin(45)])
circle(d=circle_diameter);
}

translate([-circle_diameter/2,-circle_diameter/2])
square([circle_diameter/2,circle_diameter]);

translate([width,-circle_diameter/2])
square([100,circle_diameter*2]);
}
}
